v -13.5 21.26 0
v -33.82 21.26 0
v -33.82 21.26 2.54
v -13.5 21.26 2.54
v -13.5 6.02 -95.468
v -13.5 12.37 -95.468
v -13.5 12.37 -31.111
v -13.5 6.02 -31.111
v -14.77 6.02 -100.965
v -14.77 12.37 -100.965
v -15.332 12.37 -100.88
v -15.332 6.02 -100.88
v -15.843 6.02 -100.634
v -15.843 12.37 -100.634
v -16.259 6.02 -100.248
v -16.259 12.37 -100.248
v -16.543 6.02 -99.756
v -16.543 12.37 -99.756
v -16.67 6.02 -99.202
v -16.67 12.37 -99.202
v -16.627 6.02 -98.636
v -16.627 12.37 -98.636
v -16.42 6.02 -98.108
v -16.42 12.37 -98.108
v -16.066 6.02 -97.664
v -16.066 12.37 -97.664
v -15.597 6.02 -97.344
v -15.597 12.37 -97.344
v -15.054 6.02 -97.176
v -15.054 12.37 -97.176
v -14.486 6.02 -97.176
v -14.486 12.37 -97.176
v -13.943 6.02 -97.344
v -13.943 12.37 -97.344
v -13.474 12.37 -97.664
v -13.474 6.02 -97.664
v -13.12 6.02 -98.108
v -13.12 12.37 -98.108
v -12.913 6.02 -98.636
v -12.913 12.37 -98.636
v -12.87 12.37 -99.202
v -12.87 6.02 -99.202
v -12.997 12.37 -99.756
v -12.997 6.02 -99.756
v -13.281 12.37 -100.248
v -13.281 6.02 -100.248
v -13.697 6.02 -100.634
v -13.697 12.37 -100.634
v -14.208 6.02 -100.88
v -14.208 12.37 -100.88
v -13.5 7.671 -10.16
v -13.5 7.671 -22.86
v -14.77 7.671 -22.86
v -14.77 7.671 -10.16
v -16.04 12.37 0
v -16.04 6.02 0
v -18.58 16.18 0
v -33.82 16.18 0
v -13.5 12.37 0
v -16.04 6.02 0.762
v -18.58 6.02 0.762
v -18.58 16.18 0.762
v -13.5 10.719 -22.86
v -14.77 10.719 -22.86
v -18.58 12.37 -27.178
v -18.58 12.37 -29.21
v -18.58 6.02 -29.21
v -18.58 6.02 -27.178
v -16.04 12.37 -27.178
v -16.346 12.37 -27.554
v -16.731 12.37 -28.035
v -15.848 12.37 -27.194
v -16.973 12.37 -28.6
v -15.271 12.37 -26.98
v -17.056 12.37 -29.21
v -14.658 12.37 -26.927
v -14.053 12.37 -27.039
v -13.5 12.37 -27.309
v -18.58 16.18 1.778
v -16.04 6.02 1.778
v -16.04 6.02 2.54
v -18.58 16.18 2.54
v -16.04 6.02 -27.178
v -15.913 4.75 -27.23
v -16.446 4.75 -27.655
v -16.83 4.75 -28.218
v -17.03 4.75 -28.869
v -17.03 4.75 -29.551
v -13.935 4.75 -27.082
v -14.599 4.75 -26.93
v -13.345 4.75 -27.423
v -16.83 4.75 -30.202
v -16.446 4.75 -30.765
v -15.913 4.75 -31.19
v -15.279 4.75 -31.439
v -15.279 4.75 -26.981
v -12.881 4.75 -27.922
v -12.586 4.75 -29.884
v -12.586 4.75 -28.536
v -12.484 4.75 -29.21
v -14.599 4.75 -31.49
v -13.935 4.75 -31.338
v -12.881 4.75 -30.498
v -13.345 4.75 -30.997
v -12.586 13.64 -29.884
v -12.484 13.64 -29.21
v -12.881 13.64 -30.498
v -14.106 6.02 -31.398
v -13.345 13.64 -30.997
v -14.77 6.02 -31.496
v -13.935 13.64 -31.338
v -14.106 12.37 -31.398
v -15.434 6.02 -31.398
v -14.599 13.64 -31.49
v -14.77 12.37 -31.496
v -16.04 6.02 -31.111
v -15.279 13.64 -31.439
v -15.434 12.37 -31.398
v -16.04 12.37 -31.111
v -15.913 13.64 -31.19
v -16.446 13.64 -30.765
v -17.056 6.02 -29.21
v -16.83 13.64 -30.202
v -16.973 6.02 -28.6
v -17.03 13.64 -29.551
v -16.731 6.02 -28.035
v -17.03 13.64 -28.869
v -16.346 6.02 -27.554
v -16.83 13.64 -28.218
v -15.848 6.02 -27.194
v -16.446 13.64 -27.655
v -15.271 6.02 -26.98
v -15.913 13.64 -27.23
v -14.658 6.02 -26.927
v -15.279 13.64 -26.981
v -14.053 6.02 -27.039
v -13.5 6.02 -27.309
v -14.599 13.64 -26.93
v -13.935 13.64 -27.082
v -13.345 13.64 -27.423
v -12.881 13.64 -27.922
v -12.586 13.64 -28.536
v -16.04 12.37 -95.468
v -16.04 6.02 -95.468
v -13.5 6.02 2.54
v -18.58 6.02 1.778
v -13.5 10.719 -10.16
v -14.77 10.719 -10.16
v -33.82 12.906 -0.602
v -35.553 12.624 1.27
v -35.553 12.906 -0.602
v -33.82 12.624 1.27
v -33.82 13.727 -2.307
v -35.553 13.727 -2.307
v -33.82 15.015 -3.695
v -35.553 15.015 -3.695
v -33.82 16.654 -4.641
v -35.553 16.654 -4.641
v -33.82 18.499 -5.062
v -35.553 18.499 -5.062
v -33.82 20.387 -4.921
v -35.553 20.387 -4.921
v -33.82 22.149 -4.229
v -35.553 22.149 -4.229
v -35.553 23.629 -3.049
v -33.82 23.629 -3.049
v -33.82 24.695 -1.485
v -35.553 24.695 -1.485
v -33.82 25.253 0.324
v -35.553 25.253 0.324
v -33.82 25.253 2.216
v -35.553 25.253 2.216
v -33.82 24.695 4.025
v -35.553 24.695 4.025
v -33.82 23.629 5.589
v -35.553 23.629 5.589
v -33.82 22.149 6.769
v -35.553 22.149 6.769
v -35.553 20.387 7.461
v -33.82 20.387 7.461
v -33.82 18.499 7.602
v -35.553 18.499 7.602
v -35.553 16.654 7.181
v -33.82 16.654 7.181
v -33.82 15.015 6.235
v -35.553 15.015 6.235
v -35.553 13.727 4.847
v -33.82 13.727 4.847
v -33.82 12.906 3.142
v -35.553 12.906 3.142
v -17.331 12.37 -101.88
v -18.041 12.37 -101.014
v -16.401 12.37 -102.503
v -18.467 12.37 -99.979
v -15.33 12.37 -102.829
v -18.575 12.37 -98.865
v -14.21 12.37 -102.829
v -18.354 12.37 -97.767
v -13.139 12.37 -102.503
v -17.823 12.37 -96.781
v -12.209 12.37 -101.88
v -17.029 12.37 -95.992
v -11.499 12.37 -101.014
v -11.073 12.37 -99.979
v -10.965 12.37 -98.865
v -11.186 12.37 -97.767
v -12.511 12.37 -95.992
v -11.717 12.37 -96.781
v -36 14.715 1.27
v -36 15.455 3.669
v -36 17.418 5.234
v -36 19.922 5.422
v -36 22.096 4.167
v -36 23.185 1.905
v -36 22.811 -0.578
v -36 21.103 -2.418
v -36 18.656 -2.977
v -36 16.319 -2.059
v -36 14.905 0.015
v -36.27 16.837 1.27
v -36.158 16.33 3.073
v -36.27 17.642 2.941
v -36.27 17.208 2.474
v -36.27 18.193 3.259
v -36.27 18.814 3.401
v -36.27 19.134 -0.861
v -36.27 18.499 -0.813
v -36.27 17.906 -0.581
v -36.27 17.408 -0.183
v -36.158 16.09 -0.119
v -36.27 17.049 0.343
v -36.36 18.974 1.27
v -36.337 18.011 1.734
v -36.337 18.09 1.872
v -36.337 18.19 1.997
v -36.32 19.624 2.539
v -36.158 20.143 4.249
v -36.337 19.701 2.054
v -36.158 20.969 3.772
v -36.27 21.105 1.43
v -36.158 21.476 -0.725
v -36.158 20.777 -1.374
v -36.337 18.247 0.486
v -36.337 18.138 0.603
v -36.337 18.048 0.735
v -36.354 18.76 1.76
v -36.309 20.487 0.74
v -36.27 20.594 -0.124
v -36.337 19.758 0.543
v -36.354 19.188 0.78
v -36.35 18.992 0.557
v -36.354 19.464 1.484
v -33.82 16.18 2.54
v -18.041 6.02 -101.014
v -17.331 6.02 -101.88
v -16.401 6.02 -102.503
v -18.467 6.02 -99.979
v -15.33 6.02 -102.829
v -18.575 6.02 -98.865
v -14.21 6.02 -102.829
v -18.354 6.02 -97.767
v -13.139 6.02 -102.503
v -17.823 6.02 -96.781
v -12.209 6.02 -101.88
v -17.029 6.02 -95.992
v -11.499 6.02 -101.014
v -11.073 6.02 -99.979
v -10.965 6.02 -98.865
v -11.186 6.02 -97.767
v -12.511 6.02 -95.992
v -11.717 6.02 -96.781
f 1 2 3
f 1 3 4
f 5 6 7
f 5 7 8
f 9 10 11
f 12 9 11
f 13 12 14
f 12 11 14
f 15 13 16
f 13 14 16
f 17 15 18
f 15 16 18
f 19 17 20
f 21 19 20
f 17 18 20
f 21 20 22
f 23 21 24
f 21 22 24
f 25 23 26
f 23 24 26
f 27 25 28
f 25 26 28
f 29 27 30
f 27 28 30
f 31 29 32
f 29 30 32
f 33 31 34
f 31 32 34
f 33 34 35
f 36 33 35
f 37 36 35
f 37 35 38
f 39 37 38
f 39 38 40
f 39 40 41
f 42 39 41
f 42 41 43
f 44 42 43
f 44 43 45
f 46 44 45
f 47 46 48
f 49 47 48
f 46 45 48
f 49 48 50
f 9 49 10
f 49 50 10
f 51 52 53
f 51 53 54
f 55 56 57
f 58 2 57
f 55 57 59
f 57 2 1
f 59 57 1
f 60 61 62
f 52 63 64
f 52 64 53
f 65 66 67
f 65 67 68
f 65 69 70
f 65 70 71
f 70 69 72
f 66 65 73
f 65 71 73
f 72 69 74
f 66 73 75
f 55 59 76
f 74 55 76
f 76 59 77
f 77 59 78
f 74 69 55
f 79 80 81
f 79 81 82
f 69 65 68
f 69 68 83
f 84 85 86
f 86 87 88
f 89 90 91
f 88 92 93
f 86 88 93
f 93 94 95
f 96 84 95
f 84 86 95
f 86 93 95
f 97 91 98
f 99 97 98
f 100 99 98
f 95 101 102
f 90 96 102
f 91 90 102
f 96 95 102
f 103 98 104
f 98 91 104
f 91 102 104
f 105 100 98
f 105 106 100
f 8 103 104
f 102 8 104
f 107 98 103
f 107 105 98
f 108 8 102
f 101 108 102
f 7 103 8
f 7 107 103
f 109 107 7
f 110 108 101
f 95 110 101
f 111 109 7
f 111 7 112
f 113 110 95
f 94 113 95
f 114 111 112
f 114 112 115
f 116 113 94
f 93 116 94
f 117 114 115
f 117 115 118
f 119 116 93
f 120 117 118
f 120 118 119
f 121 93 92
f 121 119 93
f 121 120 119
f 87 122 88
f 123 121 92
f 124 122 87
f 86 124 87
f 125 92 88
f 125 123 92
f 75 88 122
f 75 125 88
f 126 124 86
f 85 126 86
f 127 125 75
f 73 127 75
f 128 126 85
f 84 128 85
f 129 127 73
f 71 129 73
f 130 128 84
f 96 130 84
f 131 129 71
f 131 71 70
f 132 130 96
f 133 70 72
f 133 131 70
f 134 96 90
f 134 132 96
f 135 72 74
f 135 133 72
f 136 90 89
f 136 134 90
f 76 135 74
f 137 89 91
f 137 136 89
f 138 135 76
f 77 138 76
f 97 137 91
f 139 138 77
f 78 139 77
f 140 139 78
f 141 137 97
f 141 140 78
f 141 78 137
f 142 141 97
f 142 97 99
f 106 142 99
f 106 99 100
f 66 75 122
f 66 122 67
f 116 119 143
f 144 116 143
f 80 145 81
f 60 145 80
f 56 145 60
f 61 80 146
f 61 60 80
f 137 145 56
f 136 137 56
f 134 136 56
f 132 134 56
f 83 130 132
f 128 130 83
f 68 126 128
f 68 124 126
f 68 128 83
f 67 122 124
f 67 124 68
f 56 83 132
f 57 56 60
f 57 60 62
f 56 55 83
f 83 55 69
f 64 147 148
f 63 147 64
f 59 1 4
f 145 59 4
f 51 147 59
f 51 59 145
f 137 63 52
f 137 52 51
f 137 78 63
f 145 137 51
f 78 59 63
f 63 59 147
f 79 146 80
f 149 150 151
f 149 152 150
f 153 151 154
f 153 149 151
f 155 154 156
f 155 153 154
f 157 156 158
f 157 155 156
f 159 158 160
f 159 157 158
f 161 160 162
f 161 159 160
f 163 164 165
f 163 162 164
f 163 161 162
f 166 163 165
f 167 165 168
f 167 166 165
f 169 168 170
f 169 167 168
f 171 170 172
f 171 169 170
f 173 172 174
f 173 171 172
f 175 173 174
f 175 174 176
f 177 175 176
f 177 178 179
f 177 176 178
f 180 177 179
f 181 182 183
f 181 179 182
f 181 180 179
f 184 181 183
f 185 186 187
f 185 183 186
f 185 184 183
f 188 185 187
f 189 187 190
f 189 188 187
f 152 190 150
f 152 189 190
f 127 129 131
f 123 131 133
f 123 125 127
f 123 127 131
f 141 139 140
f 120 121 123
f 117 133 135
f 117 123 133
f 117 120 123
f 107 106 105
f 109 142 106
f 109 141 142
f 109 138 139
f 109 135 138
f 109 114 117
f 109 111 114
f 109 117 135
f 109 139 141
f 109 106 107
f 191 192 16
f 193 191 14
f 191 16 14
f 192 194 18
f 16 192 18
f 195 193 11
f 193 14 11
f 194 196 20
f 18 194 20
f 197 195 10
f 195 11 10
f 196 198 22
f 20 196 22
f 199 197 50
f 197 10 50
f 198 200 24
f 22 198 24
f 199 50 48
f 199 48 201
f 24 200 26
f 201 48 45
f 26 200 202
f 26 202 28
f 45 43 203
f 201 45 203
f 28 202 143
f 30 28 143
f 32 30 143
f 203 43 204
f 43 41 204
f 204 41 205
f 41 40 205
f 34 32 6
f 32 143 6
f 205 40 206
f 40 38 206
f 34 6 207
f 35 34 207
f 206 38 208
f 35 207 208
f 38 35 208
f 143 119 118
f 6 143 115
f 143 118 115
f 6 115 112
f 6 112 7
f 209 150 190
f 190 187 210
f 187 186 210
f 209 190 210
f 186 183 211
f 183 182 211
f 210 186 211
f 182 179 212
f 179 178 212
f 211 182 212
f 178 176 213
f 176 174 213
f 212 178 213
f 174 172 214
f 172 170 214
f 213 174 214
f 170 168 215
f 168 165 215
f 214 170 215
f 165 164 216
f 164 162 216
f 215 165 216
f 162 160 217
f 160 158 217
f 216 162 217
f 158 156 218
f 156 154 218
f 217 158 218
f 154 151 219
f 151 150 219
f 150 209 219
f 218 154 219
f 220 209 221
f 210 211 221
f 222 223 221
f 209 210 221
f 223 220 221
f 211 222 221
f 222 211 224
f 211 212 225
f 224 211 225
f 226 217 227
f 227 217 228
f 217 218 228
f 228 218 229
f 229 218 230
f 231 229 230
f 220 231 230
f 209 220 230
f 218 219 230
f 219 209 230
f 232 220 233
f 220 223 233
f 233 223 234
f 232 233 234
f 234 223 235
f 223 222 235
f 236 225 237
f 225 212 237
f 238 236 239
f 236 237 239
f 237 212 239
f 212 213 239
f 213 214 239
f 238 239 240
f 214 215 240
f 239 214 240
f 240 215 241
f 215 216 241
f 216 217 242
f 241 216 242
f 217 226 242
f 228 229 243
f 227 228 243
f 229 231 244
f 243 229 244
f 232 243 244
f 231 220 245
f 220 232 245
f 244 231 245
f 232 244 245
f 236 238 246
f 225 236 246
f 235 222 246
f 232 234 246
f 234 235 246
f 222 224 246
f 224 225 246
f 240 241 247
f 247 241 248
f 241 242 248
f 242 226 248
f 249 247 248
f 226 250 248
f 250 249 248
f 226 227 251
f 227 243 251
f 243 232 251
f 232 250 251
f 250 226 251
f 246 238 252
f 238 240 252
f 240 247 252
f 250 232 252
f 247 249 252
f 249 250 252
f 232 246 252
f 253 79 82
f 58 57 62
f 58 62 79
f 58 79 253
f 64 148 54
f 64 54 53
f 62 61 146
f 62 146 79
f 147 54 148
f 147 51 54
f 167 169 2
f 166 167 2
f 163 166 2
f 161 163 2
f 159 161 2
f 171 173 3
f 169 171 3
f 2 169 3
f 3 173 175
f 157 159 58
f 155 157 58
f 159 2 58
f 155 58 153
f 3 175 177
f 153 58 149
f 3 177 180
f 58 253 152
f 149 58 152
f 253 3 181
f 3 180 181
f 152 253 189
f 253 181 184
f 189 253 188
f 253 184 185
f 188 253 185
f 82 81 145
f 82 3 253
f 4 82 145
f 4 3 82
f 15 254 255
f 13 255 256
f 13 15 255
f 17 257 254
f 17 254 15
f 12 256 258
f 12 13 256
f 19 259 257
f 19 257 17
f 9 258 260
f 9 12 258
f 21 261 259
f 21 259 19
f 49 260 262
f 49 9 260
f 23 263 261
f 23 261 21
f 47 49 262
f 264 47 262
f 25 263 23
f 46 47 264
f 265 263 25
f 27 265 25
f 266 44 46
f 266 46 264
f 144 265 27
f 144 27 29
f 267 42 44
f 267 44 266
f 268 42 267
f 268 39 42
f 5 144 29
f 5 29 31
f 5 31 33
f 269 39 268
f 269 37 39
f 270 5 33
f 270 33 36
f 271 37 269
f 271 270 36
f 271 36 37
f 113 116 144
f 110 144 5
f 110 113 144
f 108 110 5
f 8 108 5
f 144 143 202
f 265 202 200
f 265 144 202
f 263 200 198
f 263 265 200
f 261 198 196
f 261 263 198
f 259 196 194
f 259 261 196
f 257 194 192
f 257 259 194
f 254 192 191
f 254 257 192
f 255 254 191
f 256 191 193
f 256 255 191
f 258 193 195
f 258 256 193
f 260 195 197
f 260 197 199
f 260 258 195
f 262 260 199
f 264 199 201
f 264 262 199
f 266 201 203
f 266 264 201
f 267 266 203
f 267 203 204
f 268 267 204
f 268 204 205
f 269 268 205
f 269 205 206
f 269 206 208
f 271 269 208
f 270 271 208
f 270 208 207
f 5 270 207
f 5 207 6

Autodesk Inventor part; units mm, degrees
ref_plane "YZ Plane" through (0, 0, 0) normal (1, 0, 0) x (0, 1, 0)
ref_plane "XZ Plane" through (0, 0, 0) normal (0, 1, 0) x (-1, 0, 0)
ref_plane "XY Plane" through (0, 0, 0) normal (0, 0, 1) x (1, 0, 0)
sketch "Sketch1" plane through (0, 0, 0) normal (0, 0, 1) x (1, 0, 0)
  line L0 (-33.82, 21.26) -> (-13.5, 21.26)
  line L1 (-13.5, 21.26) -> (-13.5, 6.02)
  line L2 (-13.5, 6.02) -> (-16.04, 6.02)
  line L3 (-16.04, 6.02) -> (-18.58, 16.18)
  line L4 (-18.58, 16.18) -> (-33.82, 16.18)
  line L5 (-33.82, 16.18) -> (-33.82, 21.26)
  dimension "d0" = 20.32
  dimension "d1" = 15.24
  dimension "d2" = 5.08
  dimension "d3" = 2.54
  dimension "d4" = 15.24
extrude "Extrusion1" add sketch "Sketch1" along normal blind 2.54
ref_plane "Work Plane1" through (0, 0, 1.27) normal (0, 0, 1) x (1, 0, 0)
sketch "Sketch2" plane through (0, 0, 1.27) normal (0, 0, 1) x (1, 0, 0)
  line L0 (-33.82, 18.974) -> (-36.36, 18.974)
  arc A0 (-36.36, 18.974) -> (-35.5534, 12.624) centre (-10.96, 18.974) ccw
  line L1 (-35.5534, 12.624) -> (-33.82, 12.624)
  line L2 (-33.82, 12.624) -> (-33.82, 18.974)
  line L3 (-33.82, 16.18) -> (-33.82, 21.26) projected
  line L4 (-33.82, 21.26) -> (-13.5, 21.26) projected
  dimension "d8" = 2.54
  dimension "d9" = 6.35
  dimension "d10" = 25.4
  dimension "d11" = 2.286
revolve "Revolution1" add sketch "Sketch2" angle 360 about axis through (-33.82, 18.974, 1.27) along (-1, 0, 0)
sketch "Sketch3" plane through (0, 0, 1.27) normal (0, 0, 1) x (1, 0, 0)
  line L0 (-16.04, 6.02) -> (-18.58, 6.02)
  line L1 (-18.58, 6.02) -> (-18.58, 18.72)
  line L2 (-18.58, 18.72) -> (-16.04, 18.72)
  line L3 (-16.04, 18.72) -> (-16.04, 6.02)
  line L4 (-13.5, 6.02) -> (-16.04, 6.02) projected
  dimension "d13" = 12.7
  dimension "d14" = 2.54
extrude "Extrusion2" add sketch "Sketch3" along normal mid plane 1.016
sketch "Sketch4" plane through (-13.5, 6.02, 0) normal (1, 0, 0) x (0, 0, -1)
  line L0 (-2.54, 15.24) -> (-2.54, 0) projected
  line L1 (0, 15.24) -> (-2.54, 15.24) projected
  line L2 (-2.54, 0) -> (99.06, 0)
  line L3 (-2.54, 6.35) -> (99.06, 6.35)
  line L4 (99.06, 6.35) -> (99.06, 0)
  dimension "d17" = 6.35
  dimension "d18" = 101.6
extrude "Extrusion3" add sketch "Sketch4" against normal blind 2.54
ref_plane "Work Plane2" through (-13.5, 13.64, 0) normal (0, 1, 0) x (1, 0, 0)
sketch "Sketch5" plane through (-13.5, 13.64, 0) normal (0, 1, 0) x (1, 0, 0)
  circle A0 centre (-1.27, 29.21) radius 2.286
  line L0 (0, 99.06) -> (0, 0) projected
  line L1 (-20.32, -2.54) -> (0, -2.54) projected
  dimension "d22" = 4.572
  dimension "d23" = 1.27
  dimension "d24" = 31.75
extrude "Extrusion4" add sketch "Sketch5" against normal blind 8.89
sketch "Sketch6" plane through (-16.04, 12.37, 0) normal (0, 1, 0) x (1, 0, 0)
  arc A0 (0, 27.3092) -> (2.54, 27.3092) centre (1.27, 29.21) ccw projected
  line L0 (0, 27.3092) -> (0, 0) projected
  line L1 (2.54, 27.3092) -> (2.54, 0) projected
  line L2 (1.27, 29.21) -> (-2.54, 29.21)
  line L3 (-2.54, 29.21) -> (-2.54, 27.178)
  line L4 (-2.54, 27.178) -> (1.27, 27.178)
  line L5 (1.27, 27.178) -> (1.27, 29.21)
  line L6 (-2.54, -1.778) -> (-2.54, -0.762) projected
  dimension "d27" = 2.032
extrude "Extrusion5" add sketch "Sketch6" against normal up to surface (6.35 mm away)
sketch "Sketch7" plane through (-16.04, 6.02, -99.06) normal (0, -1, 0) x (1, 0, 0)
  line L0 (0, 67.9492) -> (0, 0) projected
  line L1 (2.54, 67.9492) -> (2.54, 0) projected
  circle A0 centre (1.27, 0) radius 3.81
  circle A1 centre (1.27, 0) radius 1.27 construction
  arc A2 (2.54, 71.7508) -> (-1.016, 69.85) centre (1.27, 69.85) ccw projected
  dimension "d31" = 7.62
  dimension "d42" = 69.85
extrude "Extrusion6" add sketch "Sketch7" against normal up to surface (6.35 mm away)
sketch "Sketch8" plane through (-14.77, 6.02, -29.21) normal (0, -1, 0) x (1, 0, 0)
  arc A0 (-1.27, -66.2579) -> (1.27, -66.2579) centre (0, -69.85) ccw projected
hole "Hole1" at (-14.77, 6.02, -99.06) direction (0, 1, 0) diameter 3.81 end through all
sketch "Sketch9" plane through (-13.5, 6.02, 2.54) normal (1, 0, 0) x (0, 0, -1)
  line L0 (29.8492, 6.35) -> (2.54, 6.35) projected
  line L1 (0, 0) -> (29.8492, 0) projected
  circle A0 centre (14.8195, 3.175) radius 3.175 construction
  line L2 (0, 15.24) -> (0, 0) projected
  line L3 (12.7, 4.699) -> (25.4, 4.699)
  line L4 (25.4, 4.699) -> (25.4, 1.651)
  line L5 (25.4, 1.651) -> (12.7, 1.651)
  line L6 (12.7, 1.651) -> (12.7, 4.699)
  circle A1 centre (14.8195, 3.175) radius 1.524 construction
  dimension "d46" = 12.7
  dimension "d47" = 12.7
  dimension "d48" = 3.048
extrude "Extrusion7" cut sketch "Sketch9" against normal blind 1.27
properties part number "lock"
